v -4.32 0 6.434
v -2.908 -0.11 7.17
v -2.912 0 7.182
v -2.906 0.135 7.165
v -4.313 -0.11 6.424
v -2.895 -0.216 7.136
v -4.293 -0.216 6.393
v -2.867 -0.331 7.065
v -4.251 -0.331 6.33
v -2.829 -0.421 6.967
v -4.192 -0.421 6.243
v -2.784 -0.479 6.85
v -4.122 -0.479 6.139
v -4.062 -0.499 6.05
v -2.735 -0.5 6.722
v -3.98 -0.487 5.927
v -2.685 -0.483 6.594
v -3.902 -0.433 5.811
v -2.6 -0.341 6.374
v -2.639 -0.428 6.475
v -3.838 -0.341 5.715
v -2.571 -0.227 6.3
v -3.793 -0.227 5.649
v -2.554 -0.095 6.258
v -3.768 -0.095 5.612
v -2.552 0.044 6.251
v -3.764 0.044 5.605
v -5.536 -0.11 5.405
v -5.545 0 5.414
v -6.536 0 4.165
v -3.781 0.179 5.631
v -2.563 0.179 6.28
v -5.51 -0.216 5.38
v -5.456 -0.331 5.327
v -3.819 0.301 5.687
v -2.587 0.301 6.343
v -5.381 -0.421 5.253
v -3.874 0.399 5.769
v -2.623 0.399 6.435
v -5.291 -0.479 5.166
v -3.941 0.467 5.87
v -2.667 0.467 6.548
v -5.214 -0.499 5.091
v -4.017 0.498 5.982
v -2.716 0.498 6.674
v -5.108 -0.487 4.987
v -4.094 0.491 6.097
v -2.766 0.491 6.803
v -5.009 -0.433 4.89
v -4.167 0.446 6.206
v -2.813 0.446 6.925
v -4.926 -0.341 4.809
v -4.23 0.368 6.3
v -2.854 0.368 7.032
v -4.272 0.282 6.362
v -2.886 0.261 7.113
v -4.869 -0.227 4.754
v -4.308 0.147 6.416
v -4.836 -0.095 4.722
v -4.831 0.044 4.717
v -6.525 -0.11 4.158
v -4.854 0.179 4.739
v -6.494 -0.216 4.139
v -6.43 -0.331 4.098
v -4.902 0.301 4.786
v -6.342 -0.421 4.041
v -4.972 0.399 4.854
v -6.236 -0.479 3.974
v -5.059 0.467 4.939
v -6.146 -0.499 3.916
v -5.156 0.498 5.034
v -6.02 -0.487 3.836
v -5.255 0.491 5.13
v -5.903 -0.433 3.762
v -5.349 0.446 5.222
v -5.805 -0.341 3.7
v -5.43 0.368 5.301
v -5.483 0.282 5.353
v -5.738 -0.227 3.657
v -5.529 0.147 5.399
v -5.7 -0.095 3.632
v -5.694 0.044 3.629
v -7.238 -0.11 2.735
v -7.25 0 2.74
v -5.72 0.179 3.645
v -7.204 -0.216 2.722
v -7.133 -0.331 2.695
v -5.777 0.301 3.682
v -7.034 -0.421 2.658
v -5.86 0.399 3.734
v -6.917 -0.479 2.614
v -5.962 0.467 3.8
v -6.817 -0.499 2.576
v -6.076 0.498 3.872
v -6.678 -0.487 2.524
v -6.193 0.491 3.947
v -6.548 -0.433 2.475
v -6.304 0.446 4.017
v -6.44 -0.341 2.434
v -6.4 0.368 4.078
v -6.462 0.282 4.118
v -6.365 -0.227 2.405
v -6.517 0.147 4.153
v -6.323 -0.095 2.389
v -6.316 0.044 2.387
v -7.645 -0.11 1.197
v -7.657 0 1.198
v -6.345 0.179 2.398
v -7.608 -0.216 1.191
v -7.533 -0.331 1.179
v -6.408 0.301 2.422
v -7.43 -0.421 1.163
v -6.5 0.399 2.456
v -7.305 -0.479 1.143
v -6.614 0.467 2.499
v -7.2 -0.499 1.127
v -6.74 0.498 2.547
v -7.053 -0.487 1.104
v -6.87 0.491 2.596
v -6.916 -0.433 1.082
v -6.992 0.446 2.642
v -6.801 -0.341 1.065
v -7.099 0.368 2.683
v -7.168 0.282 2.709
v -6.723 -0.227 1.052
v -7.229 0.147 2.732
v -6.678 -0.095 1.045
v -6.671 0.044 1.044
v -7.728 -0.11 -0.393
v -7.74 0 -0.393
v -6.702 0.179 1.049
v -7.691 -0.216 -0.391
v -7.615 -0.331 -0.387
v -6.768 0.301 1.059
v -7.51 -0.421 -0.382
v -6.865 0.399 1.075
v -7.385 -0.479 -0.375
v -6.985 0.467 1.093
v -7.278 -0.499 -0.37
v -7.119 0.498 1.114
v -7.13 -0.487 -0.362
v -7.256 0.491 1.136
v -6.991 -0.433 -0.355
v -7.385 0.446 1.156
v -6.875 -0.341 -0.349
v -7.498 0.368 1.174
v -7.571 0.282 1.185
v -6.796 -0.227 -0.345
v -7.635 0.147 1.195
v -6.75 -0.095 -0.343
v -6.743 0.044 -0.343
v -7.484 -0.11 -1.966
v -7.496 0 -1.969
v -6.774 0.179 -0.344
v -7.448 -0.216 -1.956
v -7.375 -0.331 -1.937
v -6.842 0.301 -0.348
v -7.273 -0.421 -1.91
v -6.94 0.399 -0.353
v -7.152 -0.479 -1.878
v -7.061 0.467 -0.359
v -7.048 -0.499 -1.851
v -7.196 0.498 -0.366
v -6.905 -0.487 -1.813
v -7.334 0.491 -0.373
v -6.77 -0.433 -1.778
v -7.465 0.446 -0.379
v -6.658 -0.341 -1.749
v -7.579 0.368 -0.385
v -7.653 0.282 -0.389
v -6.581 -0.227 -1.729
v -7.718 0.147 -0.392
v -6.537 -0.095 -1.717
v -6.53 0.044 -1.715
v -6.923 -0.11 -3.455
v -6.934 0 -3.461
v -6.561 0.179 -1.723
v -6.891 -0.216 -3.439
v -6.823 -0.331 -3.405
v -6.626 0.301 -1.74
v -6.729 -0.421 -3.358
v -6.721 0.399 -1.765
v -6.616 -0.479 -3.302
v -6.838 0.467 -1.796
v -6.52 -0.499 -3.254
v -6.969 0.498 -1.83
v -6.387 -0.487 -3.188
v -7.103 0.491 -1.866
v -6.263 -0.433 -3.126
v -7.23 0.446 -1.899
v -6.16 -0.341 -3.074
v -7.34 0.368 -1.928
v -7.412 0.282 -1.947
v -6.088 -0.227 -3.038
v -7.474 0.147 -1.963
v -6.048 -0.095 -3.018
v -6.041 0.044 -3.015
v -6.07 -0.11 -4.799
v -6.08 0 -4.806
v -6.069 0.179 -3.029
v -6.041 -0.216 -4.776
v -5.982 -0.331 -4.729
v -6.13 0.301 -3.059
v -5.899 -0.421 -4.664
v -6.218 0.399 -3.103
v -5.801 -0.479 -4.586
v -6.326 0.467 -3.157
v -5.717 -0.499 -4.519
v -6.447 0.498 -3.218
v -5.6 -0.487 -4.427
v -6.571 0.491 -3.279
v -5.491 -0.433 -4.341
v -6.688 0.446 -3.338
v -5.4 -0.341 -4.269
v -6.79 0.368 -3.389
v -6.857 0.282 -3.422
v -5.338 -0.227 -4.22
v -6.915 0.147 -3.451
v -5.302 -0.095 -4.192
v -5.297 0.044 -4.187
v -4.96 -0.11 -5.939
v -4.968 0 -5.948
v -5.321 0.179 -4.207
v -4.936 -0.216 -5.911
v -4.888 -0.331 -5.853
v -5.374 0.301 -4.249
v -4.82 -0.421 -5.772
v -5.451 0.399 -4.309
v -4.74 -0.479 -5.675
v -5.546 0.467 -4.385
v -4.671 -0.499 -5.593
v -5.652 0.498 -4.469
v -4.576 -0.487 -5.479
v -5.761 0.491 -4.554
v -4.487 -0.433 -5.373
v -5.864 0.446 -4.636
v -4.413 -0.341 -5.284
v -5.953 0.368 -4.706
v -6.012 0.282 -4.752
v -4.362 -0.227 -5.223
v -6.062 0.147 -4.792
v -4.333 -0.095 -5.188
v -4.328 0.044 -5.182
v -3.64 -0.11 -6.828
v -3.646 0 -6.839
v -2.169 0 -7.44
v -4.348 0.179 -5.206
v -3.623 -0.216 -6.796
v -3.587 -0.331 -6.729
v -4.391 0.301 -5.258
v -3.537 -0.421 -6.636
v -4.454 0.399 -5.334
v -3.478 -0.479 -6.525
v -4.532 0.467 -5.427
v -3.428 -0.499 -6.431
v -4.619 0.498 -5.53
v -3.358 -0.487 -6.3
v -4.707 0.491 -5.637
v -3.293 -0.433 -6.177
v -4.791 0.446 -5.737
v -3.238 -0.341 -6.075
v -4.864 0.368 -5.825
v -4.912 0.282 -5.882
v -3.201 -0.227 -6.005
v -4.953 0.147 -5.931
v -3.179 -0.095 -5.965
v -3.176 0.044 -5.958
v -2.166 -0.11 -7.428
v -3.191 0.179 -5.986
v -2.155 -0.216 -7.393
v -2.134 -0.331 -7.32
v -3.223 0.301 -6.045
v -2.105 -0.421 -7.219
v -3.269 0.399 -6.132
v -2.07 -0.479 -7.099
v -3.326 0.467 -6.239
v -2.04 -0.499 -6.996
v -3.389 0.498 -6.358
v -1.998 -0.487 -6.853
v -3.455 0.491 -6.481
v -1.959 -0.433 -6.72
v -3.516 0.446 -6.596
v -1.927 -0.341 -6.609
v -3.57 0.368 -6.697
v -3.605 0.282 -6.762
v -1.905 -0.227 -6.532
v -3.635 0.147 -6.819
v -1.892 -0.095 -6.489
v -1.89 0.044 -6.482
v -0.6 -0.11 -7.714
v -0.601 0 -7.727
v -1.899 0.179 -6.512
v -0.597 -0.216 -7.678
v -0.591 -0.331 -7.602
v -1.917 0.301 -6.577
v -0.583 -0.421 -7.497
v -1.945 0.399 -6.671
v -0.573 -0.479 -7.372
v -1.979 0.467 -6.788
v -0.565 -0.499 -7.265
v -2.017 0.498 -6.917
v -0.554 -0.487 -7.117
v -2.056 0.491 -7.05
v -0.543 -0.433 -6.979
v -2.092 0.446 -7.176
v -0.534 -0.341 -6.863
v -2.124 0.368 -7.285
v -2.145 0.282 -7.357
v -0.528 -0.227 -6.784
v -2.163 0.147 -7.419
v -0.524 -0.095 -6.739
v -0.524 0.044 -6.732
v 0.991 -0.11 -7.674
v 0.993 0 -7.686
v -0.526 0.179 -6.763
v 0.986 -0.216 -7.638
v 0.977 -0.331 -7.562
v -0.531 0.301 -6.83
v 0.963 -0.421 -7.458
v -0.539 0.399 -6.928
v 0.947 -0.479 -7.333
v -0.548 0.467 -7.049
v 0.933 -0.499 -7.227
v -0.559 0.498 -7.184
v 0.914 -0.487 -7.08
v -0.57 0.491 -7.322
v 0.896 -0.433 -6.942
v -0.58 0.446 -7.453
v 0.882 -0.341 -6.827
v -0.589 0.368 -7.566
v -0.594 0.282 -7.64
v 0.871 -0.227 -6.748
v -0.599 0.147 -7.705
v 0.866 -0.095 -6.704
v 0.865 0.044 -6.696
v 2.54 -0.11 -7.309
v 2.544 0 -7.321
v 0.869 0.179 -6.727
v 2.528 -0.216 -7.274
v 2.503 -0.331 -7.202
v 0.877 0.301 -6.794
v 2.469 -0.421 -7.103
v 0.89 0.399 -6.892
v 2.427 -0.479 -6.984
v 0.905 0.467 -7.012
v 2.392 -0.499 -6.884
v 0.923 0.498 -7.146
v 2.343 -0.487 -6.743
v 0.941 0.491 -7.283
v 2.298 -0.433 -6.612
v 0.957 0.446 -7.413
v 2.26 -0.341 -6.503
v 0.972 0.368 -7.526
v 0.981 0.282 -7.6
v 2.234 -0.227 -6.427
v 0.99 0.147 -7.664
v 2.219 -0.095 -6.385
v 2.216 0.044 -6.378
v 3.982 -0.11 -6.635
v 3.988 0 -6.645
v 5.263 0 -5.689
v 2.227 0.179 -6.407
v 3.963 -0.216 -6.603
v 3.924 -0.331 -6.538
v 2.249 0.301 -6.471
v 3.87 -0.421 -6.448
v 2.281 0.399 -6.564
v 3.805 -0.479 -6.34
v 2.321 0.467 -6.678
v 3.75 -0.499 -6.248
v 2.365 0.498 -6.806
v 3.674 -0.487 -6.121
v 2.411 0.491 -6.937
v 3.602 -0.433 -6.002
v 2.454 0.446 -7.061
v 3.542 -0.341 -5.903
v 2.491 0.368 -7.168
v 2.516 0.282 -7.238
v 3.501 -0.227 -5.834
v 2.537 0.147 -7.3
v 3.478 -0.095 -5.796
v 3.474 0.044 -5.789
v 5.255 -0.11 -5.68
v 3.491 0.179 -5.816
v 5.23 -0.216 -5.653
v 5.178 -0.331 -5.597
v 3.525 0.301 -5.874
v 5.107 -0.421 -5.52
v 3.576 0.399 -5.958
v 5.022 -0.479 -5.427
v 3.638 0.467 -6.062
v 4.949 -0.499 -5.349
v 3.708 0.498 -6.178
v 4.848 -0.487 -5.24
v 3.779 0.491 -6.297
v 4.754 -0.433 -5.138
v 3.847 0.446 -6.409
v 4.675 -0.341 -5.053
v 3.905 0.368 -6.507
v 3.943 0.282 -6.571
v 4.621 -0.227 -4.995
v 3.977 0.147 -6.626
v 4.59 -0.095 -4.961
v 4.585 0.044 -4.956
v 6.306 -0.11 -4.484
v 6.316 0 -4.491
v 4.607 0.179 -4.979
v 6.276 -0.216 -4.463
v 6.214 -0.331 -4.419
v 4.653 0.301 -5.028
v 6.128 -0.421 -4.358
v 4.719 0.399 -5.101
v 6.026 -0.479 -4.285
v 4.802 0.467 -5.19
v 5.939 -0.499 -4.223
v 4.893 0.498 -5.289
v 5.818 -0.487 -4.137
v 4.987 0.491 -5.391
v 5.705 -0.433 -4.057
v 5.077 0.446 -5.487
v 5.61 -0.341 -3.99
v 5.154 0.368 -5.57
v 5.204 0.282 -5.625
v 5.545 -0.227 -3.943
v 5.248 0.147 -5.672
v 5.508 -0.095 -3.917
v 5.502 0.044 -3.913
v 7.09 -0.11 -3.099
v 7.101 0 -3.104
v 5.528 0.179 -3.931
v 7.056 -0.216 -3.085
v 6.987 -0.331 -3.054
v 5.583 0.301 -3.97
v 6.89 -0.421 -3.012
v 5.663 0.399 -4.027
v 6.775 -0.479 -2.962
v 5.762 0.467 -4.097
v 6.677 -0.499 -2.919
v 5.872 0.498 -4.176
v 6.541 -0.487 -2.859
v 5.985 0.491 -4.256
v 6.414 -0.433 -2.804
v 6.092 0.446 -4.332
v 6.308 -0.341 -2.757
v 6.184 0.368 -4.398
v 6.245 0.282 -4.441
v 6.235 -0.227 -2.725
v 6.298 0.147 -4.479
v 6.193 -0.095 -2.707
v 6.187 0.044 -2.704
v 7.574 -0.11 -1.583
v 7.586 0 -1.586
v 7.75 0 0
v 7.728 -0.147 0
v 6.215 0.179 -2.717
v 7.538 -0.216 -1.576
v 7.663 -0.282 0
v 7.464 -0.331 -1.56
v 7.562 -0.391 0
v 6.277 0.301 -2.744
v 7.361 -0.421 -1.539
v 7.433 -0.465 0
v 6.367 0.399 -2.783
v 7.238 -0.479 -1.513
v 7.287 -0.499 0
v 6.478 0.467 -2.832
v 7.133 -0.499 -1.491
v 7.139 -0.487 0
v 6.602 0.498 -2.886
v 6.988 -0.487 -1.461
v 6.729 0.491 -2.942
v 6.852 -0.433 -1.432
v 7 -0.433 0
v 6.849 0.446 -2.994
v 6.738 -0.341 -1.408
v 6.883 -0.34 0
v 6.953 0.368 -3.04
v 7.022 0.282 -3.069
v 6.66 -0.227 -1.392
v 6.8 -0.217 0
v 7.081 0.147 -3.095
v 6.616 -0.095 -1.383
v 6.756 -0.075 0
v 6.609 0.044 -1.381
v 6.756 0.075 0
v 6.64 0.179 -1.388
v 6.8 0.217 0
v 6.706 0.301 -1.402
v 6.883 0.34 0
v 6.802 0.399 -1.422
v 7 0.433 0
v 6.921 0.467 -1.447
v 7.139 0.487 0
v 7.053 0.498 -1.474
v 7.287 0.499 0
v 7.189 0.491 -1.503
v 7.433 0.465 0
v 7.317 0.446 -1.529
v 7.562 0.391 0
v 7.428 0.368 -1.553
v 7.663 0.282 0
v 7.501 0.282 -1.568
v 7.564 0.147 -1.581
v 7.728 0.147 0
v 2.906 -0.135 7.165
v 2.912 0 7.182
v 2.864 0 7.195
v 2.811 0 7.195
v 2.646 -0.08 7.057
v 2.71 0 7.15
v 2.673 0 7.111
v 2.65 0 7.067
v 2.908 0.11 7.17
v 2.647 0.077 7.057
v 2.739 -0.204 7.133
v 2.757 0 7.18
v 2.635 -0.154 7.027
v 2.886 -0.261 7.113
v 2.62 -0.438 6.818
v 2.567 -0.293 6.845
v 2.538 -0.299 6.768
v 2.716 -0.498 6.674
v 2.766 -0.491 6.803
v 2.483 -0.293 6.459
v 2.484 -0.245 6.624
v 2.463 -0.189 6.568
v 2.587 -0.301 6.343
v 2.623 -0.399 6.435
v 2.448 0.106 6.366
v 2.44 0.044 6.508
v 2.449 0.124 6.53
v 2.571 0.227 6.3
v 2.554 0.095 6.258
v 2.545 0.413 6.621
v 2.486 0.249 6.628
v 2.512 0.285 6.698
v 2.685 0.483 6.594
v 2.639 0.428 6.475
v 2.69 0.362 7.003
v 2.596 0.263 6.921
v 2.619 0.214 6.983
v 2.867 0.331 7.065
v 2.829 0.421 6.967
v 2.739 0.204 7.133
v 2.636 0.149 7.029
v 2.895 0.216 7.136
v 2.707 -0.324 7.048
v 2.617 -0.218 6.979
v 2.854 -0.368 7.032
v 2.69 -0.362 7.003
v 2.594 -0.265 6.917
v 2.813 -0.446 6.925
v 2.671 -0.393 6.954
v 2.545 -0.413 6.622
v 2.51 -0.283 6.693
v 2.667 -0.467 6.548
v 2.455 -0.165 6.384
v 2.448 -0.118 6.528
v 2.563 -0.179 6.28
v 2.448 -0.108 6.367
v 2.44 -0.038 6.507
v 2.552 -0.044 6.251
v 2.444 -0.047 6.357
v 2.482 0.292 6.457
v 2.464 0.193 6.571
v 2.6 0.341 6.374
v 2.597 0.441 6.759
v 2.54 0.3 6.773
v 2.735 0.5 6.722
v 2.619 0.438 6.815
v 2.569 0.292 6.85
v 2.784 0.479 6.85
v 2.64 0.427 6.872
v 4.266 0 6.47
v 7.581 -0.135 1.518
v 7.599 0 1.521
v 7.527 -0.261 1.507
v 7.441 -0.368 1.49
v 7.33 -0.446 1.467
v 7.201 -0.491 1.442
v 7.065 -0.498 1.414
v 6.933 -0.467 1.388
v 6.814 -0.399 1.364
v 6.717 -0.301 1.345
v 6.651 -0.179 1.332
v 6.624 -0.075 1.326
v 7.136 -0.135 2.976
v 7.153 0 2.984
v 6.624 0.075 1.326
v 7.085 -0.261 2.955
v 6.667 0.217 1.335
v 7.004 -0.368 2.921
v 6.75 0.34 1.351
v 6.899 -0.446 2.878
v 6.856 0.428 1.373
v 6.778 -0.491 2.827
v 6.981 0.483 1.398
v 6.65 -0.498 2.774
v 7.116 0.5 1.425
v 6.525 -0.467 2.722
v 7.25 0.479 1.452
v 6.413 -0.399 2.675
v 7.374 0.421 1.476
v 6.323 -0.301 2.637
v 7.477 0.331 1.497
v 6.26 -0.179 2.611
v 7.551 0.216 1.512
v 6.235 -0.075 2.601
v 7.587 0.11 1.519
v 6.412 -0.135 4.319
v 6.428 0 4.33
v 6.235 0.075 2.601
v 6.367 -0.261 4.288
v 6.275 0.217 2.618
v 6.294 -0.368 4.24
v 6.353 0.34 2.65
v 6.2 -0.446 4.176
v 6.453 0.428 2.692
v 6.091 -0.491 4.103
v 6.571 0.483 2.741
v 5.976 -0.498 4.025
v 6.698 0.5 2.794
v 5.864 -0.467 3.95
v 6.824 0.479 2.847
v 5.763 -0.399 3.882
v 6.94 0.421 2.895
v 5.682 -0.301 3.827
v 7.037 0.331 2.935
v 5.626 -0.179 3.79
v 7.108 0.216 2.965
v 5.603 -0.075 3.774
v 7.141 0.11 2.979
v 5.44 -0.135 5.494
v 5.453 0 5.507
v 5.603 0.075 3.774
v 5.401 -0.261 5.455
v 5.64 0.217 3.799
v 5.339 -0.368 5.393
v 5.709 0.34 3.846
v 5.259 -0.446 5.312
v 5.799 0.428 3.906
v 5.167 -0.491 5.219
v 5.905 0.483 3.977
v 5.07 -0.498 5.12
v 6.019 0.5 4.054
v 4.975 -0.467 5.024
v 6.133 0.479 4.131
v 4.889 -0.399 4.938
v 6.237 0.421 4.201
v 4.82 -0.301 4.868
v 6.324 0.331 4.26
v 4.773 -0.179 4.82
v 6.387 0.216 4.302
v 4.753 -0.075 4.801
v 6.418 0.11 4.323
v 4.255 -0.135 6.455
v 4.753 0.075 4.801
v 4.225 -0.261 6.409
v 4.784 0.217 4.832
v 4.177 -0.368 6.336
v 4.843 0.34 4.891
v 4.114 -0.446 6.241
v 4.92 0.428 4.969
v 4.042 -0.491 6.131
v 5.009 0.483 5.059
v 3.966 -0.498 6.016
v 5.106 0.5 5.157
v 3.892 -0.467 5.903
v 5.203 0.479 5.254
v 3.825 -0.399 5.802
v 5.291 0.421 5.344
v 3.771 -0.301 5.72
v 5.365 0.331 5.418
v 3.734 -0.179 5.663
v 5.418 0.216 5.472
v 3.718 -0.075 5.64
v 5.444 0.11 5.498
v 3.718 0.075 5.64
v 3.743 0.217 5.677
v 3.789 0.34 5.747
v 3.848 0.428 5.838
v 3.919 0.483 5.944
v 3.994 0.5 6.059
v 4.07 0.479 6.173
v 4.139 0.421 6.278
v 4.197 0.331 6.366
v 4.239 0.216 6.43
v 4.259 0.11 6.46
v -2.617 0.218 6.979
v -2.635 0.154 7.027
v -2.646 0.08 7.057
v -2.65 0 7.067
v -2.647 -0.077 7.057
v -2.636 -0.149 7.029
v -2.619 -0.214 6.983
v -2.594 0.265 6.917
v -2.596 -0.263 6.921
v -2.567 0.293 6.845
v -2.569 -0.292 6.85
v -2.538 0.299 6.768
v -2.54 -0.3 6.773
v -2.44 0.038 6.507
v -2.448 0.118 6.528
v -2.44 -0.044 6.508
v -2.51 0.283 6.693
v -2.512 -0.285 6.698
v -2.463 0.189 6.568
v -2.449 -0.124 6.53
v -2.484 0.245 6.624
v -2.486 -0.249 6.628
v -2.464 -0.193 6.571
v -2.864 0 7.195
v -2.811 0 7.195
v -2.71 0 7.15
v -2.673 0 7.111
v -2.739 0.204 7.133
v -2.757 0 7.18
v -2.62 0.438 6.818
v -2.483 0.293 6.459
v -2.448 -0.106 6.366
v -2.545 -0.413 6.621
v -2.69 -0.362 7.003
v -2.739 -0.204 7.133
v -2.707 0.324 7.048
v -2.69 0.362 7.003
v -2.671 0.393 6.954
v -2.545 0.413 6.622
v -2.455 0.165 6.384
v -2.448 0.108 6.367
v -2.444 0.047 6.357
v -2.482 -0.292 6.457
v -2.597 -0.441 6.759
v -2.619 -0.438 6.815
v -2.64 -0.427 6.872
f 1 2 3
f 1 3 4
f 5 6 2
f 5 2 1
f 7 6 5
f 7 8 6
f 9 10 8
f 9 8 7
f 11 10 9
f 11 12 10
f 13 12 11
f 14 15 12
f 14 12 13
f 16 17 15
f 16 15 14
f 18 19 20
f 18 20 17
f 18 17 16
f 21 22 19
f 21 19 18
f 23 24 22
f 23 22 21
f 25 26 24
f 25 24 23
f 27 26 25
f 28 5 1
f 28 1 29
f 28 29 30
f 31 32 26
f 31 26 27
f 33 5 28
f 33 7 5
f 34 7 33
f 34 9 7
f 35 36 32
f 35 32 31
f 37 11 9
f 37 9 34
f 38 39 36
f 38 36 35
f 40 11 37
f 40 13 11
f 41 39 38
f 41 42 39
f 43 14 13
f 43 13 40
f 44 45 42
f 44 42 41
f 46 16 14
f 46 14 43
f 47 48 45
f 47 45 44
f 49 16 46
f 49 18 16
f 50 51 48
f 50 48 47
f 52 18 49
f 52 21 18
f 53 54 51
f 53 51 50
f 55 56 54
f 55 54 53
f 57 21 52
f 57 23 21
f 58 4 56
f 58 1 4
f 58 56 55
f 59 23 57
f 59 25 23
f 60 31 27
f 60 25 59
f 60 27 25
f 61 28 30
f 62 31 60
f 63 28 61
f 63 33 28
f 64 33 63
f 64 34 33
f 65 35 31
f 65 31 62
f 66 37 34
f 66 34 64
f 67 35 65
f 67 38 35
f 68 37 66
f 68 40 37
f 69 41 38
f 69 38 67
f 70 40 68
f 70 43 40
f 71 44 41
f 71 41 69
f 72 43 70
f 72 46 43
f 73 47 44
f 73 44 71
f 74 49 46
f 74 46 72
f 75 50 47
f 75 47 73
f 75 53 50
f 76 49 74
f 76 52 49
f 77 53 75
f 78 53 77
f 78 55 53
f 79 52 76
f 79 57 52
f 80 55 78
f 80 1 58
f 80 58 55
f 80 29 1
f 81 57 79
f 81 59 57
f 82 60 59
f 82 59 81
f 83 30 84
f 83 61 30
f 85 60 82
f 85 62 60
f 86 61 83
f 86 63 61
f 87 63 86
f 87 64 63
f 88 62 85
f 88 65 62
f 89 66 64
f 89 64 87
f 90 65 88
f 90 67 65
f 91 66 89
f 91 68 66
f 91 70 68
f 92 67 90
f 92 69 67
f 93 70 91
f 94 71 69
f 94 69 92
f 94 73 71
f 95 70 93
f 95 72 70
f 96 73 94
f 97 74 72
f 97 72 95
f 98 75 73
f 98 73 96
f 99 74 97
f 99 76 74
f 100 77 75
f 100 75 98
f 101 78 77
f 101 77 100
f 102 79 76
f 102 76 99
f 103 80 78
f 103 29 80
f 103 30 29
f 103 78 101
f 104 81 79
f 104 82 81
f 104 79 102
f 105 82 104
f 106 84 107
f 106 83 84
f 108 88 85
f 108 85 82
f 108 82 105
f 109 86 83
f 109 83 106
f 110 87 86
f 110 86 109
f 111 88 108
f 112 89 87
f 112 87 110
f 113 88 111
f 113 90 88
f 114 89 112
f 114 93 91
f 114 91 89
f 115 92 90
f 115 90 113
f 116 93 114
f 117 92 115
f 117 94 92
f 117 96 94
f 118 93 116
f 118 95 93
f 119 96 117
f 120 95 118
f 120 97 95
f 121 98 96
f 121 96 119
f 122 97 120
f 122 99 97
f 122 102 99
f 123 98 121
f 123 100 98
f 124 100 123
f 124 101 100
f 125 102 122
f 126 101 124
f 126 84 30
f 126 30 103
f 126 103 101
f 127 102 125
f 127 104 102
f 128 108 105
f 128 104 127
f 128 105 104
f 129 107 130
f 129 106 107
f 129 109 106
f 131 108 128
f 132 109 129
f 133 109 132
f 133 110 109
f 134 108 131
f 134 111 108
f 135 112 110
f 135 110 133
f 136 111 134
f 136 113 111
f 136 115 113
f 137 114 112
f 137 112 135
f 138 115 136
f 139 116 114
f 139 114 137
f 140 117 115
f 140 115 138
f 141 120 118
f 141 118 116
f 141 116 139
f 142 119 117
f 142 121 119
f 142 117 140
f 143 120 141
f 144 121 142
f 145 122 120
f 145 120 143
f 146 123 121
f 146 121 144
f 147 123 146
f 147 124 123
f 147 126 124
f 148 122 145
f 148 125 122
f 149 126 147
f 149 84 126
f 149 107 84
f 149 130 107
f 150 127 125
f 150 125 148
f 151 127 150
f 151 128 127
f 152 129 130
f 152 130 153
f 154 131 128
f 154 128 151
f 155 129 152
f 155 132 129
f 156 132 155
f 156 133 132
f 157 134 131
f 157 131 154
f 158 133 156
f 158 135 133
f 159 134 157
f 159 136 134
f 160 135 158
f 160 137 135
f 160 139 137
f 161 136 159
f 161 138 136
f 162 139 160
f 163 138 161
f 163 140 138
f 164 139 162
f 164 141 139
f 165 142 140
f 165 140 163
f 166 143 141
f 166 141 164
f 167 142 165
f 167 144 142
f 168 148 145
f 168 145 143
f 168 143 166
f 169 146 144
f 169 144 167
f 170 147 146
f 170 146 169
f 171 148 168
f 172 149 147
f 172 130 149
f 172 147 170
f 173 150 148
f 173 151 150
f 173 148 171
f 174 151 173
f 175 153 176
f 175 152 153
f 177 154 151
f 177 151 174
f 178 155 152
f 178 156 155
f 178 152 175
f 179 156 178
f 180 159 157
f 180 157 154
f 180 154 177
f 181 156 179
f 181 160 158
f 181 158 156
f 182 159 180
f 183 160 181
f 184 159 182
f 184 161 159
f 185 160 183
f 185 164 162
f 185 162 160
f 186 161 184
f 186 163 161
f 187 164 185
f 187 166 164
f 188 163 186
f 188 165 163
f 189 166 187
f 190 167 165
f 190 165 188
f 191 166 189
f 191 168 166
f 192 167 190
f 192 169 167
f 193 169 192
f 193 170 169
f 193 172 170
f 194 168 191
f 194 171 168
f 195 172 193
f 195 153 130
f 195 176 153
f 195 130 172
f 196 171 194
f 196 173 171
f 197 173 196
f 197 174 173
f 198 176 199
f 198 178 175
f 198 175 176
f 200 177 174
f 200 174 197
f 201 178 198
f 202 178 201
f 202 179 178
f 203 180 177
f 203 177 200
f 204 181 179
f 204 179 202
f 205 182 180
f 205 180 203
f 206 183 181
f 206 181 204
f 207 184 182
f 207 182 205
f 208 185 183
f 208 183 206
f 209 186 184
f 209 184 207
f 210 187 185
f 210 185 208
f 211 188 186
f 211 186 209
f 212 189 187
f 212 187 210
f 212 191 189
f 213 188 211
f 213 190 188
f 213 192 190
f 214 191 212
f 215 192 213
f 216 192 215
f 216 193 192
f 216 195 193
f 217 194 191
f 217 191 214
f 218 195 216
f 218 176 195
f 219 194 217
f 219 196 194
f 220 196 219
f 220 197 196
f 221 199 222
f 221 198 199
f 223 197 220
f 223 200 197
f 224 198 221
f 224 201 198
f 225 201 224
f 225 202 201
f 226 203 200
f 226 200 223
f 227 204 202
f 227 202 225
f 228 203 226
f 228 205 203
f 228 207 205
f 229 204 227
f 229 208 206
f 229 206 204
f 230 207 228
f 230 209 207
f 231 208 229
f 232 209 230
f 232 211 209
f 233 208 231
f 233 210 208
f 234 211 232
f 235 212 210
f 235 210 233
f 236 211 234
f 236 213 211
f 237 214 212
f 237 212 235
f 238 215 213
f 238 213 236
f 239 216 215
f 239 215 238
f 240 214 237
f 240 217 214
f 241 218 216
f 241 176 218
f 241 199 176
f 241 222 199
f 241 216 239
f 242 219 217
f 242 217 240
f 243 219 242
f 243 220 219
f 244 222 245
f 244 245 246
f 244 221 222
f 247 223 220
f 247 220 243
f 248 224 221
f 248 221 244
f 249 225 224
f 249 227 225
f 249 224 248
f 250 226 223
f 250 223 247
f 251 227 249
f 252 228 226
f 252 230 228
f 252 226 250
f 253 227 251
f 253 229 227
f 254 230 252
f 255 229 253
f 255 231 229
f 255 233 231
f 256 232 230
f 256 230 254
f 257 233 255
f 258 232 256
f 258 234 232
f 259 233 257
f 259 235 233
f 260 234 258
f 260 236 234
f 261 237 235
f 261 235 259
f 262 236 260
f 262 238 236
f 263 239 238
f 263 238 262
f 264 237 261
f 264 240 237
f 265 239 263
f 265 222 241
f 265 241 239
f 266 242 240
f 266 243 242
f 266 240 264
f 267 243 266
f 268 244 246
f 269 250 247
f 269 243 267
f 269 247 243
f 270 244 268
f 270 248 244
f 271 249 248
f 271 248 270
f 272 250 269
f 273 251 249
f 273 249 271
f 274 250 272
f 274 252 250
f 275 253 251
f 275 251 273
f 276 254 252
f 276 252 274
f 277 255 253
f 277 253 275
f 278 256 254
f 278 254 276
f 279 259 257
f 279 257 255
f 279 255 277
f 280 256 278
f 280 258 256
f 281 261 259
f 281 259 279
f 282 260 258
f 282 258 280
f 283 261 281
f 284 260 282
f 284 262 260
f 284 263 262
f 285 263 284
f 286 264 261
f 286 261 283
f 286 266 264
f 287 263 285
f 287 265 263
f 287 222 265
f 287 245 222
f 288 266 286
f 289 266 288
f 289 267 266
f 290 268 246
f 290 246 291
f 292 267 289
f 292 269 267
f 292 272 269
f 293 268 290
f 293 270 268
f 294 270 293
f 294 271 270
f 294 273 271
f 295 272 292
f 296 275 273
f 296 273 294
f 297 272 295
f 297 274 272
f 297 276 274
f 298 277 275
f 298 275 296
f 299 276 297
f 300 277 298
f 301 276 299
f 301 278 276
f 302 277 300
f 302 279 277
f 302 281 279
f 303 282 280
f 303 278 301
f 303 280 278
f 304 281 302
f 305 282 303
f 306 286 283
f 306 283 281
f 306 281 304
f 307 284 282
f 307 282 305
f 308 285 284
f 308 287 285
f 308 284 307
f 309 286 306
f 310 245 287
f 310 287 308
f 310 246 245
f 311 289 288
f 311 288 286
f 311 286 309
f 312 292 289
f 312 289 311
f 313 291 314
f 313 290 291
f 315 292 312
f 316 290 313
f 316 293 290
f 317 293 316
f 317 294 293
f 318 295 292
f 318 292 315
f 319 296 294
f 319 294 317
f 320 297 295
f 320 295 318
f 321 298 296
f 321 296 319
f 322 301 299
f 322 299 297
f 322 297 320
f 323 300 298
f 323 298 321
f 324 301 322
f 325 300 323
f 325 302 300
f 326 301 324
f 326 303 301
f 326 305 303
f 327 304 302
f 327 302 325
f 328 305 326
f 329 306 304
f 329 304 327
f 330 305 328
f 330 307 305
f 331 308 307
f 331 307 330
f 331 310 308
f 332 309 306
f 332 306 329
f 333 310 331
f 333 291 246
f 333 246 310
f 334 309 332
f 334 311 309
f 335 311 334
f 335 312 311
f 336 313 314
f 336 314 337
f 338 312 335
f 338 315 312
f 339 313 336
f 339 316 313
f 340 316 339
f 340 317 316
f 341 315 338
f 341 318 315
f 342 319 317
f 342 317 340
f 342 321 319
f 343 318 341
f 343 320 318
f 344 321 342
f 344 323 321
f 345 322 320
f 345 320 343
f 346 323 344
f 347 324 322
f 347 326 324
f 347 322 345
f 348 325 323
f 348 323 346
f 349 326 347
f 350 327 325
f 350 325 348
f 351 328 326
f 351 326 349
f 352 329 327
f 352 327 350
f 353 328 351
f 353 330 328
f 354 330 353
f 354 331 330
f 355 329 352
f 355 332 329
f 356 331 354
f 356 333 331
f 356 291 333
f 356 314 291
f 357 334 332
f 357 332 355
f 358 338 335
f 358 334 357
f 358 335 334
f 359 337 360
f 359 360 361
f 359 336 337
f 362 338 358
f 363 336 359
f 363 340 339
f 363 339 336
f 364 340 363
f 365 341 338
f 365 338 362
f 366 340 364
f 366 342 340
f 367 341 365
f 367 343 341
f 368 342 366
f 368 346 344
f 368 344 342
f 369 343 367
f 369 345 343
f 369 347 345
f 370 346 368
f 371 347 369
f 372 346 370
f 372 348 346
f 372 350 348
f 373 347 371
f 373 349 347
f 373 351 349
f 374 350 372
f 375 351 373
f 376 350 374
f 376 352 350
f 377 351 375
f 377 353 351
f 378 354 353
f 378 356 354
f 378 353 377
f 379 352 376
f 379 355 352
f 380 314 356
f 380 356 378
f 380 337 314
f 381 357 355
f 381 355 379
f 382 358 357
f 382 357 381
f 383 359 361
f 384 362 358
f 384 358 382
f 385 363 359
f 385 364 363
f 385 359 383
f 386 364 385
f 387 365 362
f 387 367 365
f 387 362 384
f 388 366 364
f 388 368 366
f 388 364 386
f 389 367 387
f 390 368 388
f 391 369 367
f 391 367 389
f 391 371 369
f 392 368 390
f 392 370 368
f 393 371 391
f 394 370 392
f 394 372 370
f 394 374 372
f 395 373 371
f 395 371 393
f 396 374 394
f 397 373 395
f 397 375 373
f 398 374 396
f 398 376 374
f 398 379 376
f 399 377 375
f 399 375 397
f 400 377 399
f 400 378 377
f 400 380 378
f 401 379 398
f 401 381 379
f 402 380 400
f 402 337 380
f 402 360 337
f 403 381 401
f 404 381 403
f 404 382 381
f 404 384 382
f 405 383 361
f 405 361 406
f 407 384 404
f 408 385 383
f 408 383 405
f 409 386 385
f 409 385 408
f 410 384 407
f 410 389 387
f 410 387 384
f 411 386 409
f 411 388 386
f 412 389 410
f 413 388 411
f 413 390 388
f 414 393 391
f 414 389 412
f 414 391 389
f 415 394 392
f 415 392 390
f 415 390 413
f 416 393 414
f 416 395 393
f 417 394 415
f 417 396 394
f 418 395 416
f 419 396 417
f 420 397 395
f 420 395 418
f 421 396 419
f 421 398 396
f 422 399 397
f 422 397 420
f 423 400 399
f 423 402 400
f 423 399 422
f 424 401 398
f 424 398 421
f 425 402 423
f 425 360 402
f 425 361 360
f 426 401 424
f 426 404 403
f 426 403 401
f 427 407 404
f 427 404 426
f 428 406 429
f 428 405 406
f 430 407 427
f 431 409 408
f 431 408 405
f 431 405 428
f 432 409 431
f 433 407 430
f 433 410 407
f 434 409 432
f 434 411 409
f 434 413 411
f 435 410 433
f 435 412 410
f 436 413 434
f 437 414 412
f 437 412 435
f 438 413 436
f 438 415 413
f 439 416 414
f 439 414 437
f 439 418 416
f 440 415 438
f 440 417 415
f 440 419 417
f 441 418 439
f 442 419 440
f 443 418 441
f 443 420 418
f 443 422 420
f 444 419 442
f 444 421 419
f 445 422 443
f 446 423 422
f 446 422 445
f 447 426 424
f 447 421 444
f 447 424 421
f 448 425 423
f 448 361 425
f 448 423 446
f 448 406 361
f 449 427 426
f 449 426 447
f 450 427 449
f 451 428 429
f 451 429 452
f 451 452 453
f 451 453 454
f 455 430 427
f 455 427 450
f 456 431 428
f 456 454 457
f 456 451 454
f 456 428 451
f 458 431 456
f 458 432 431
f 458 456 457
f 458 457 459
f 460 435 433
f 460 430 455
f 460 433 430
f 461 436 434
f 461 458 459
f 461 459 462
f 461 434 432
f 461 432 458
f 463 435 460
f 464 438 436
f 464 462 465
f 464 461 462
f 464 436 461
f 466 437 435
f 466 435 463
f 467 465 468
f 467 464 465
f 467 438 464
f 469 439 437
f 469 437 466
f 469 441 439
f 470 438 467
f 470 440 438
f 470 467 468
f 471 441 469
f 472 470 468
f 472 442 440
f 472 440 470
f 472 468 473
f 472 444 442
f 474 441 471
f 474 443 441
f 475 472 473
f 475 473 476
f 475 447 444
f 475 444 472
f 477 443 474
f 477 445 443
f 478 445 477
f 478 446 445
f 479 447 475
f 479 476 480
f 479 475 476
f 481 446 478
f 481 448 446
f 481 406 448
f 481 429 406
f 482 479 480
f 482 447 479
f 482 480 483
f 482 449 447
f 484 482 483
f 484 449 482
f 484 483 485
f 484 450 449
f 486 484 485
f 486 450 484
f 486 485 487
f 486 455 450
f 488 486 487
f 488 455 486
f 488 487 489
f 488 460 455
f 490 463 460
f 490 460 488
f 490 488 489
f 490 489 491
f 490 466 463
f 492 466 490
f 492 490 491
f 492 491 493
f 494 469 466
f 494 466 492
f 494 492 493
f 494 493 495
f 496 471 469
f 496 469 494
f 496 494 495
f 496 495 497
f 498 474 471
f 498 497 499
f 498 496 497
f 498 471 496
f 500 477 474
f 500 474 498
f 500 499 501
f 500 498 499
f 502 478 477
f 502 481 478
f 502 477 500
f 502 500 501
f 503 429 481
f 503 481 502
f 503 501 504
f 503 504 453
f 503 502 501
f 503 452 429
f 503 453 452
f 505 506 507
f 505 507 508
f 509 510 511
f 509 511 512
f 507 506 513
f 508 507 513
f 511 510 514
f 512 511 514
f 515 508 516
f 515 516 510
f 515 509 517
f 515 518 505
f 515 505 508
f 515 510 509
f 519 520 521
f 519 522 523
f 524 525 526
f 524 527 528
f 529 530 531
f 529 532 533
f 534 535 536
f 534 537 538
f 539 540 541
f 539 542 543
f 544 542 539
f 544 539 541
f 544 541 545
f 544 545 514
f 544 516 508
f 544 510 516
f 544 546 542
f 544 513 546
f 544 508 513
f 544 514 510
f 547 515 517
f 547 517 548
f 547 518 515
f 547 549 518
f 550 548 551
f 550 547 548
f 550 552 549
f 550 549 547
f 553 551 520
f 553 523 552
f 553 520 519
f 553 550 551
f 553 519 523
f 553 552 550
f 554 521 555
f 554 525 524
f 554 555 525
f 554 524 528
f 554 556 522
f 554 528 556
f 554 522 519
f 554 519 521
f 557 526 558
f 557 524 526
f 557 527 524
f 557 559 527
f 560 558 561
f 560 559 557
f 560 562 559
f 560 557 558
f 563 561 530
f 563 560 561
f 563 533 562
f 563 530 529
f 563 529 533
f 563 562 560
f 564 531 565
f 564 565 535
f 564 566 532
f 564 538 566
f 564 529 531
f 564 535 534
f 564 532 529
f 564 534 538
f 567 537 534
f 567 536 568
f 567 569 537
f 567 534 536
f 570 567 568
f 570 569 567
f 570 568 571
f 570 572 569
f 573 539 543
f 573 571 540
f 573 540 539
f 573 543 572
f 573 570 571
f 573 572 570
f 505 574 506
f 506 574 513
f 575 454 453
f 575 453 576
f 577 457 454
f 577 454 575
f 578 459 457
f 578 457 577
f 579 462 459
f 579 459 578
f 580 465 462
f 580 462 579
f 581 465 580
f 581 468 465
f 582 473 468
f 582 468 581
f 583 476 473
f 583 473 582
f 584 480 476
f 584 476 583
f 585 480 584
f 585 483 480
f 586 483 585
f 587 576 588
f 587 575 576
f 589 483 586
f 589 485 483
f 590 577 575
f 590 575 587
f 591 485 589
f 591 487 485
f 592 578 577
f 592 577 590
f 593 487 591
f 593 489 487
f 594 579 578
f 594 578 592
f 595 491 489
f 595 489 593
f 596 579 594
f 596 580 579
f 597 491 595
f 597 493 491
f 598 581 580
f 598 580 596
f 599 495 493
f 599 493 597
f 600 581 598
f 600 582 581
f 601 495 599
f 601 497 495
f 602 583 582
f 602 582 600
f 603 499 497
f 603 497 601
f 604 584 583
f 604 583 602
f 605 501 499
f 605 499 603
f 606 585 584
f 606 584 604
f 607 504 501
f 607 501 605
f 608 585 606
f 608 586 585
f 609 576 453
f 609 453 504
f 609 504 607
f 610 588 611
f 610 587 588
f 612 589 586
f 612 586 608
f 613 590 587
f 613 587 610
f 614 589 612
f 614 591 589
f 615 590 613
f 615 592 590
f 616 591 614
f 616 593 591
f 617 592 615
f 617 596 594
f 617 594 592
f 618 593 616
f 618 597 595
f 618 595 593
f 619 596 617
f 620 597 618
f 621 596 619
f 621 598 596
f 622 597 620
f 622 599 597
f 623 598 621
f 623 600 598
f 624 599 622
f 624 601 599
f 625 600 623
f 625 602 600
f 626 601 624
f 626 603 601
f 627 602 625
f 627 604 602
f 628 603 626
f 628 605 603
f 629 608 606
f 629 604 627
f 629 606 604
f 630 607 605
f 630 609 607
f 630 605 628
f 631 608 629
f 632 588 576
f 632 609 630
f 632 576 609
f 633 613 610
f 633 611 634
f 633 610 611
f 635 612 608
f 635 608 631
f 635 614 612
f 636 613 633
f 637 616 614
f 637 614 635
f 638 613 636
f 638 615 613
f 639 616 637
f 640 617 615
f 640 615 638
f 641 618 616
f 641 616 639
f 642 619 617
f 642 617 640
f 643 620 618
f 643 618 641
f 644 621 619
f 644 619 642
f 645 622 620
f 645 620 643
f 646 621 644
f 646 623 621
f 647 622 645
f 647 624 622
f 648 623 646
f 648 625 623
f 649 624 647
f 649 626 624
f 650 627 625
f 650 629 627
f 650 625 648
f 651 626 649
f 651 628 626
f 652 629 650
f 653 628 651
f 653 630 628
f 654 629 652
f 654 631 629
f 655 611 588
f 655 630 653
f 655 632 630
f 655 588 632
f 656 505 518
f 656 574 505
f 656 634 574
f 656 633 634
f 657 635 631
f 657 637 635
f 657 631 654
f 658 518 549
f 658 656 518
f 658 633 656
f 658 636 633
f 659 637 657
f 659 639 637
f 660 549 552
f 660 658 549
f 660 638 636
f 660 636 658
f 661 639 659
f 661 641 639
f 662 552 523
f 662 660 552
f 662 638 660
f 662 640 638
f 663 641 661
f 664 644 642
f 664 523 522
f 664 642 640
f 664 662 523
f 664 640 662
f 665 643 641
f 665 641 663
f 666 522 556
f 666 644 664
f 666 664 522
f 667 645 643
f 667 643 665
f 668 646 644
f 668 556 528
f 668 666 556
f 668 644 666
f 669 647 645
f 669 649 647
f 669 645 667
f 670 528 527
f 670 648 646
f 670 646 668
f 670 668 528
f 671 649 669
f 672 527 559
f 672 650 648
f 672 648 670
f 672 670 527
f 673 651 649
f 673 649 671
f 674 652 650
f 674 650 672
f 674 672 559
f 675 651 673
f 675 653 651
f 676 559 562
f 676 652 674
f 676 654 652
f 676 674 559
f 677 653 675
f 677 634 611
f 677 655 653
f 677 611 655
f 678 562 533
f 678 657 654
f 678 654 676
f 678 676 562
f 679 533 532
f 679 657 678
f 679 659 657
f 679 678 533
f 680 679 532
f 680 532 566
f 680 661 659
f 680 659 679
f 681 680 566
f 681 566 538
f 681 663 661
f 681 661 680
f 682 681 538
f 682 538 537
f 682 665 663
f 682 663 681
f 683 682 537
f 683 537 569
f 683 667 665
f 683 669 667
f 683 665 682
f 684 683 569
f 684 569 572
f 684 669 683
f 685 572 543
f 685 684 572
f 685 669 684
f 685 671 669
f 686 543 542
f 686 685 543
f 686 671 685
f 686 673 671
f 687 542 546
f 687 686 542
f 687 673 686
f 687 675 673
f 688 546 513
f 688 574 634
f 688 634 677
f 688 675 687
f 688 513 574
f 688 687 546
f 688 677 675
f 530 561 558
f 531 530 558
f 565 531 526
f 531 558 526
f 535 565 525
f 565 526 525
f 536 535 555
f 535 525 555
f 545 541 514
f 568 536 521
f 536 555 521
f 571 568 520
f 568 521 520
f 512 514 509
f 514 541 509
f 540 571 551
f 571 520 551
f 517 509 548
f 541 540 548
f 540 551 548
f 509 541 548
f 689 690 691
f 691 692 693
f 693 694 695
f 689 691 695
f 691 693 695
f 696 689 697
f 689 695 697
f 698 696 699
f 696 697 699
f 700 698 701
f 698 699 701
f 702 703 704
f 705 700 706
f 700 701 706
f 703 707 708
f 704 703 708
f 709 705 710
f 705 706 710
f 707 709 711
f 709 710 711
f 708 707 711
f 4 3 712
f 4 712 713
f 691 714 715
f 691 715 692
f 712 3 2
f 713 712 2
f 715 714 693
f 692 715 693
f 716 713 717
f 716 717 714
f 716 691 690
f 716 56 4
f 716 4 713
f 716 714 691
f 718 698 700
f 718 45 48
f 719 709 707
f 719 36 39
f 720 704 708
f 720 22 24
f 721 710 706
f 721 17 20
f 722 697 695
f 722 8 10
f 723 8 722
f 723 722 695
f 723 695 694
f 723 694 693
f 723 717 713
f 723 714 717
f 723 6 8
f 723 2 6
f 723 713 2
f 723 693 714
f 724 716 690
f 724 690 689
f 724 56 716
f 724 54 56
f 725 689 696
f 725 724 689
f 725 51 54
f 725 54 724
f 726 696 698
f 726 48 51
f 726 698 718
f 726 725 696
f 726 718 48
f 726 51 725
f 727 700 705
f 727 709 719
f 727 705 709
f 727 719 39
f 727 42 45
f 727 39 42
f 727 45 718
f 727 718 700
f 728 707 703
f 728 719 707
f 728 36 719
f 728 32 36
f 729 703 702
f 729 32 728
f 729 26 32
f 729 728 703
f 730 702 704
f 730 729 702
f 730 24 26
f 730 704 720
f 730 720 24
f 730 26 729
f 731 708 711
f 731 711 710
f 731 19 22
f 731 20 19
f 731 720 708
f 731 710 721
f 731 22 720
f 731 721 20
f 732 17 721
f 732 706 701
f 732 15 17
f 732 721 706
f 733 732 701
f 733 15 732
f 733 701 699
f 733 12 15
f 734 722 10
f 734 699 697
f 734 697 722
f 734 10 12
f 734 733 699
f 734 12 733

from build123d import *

# Parameters (mm, degrees)
F1_R     = 0.5
F4_DEPTH = 12.5
F5_R     = 0.2


with BuildPart() as f2:
    # F2: sweep along a path in F0
    with BuildLine(Plane.XZ) as f2_path:
        CenterArc((0, 0), 7.25, 0, 360)
    # F1 (on Top) → F2 (sweep)
    with BuildSketch(Plane.XY):
        with Locations((7.25, 0)):
            Circle(F1_R)
    sweep(path=f2_path.line)

    # F3 (on Front) → F4 (cut, symmetric)
    with BuildSketch(Plane.XZ):
        Polygon((-3, 8), (0, 0), (3, 8), align=None)
    extrude(amount=F4_DEPTH, both=True, mode=Mode.SUBTRACT)

    # F5
    f5_edges = [f2.edges().sort_by_distance(p)[0] for p in [
        (-2.370083, 0, 6.320222),
        (2.370083, 0, 6.320222),
    ]]
    fillet(f5_edges, radius=F5_R)


solid = f2.part
